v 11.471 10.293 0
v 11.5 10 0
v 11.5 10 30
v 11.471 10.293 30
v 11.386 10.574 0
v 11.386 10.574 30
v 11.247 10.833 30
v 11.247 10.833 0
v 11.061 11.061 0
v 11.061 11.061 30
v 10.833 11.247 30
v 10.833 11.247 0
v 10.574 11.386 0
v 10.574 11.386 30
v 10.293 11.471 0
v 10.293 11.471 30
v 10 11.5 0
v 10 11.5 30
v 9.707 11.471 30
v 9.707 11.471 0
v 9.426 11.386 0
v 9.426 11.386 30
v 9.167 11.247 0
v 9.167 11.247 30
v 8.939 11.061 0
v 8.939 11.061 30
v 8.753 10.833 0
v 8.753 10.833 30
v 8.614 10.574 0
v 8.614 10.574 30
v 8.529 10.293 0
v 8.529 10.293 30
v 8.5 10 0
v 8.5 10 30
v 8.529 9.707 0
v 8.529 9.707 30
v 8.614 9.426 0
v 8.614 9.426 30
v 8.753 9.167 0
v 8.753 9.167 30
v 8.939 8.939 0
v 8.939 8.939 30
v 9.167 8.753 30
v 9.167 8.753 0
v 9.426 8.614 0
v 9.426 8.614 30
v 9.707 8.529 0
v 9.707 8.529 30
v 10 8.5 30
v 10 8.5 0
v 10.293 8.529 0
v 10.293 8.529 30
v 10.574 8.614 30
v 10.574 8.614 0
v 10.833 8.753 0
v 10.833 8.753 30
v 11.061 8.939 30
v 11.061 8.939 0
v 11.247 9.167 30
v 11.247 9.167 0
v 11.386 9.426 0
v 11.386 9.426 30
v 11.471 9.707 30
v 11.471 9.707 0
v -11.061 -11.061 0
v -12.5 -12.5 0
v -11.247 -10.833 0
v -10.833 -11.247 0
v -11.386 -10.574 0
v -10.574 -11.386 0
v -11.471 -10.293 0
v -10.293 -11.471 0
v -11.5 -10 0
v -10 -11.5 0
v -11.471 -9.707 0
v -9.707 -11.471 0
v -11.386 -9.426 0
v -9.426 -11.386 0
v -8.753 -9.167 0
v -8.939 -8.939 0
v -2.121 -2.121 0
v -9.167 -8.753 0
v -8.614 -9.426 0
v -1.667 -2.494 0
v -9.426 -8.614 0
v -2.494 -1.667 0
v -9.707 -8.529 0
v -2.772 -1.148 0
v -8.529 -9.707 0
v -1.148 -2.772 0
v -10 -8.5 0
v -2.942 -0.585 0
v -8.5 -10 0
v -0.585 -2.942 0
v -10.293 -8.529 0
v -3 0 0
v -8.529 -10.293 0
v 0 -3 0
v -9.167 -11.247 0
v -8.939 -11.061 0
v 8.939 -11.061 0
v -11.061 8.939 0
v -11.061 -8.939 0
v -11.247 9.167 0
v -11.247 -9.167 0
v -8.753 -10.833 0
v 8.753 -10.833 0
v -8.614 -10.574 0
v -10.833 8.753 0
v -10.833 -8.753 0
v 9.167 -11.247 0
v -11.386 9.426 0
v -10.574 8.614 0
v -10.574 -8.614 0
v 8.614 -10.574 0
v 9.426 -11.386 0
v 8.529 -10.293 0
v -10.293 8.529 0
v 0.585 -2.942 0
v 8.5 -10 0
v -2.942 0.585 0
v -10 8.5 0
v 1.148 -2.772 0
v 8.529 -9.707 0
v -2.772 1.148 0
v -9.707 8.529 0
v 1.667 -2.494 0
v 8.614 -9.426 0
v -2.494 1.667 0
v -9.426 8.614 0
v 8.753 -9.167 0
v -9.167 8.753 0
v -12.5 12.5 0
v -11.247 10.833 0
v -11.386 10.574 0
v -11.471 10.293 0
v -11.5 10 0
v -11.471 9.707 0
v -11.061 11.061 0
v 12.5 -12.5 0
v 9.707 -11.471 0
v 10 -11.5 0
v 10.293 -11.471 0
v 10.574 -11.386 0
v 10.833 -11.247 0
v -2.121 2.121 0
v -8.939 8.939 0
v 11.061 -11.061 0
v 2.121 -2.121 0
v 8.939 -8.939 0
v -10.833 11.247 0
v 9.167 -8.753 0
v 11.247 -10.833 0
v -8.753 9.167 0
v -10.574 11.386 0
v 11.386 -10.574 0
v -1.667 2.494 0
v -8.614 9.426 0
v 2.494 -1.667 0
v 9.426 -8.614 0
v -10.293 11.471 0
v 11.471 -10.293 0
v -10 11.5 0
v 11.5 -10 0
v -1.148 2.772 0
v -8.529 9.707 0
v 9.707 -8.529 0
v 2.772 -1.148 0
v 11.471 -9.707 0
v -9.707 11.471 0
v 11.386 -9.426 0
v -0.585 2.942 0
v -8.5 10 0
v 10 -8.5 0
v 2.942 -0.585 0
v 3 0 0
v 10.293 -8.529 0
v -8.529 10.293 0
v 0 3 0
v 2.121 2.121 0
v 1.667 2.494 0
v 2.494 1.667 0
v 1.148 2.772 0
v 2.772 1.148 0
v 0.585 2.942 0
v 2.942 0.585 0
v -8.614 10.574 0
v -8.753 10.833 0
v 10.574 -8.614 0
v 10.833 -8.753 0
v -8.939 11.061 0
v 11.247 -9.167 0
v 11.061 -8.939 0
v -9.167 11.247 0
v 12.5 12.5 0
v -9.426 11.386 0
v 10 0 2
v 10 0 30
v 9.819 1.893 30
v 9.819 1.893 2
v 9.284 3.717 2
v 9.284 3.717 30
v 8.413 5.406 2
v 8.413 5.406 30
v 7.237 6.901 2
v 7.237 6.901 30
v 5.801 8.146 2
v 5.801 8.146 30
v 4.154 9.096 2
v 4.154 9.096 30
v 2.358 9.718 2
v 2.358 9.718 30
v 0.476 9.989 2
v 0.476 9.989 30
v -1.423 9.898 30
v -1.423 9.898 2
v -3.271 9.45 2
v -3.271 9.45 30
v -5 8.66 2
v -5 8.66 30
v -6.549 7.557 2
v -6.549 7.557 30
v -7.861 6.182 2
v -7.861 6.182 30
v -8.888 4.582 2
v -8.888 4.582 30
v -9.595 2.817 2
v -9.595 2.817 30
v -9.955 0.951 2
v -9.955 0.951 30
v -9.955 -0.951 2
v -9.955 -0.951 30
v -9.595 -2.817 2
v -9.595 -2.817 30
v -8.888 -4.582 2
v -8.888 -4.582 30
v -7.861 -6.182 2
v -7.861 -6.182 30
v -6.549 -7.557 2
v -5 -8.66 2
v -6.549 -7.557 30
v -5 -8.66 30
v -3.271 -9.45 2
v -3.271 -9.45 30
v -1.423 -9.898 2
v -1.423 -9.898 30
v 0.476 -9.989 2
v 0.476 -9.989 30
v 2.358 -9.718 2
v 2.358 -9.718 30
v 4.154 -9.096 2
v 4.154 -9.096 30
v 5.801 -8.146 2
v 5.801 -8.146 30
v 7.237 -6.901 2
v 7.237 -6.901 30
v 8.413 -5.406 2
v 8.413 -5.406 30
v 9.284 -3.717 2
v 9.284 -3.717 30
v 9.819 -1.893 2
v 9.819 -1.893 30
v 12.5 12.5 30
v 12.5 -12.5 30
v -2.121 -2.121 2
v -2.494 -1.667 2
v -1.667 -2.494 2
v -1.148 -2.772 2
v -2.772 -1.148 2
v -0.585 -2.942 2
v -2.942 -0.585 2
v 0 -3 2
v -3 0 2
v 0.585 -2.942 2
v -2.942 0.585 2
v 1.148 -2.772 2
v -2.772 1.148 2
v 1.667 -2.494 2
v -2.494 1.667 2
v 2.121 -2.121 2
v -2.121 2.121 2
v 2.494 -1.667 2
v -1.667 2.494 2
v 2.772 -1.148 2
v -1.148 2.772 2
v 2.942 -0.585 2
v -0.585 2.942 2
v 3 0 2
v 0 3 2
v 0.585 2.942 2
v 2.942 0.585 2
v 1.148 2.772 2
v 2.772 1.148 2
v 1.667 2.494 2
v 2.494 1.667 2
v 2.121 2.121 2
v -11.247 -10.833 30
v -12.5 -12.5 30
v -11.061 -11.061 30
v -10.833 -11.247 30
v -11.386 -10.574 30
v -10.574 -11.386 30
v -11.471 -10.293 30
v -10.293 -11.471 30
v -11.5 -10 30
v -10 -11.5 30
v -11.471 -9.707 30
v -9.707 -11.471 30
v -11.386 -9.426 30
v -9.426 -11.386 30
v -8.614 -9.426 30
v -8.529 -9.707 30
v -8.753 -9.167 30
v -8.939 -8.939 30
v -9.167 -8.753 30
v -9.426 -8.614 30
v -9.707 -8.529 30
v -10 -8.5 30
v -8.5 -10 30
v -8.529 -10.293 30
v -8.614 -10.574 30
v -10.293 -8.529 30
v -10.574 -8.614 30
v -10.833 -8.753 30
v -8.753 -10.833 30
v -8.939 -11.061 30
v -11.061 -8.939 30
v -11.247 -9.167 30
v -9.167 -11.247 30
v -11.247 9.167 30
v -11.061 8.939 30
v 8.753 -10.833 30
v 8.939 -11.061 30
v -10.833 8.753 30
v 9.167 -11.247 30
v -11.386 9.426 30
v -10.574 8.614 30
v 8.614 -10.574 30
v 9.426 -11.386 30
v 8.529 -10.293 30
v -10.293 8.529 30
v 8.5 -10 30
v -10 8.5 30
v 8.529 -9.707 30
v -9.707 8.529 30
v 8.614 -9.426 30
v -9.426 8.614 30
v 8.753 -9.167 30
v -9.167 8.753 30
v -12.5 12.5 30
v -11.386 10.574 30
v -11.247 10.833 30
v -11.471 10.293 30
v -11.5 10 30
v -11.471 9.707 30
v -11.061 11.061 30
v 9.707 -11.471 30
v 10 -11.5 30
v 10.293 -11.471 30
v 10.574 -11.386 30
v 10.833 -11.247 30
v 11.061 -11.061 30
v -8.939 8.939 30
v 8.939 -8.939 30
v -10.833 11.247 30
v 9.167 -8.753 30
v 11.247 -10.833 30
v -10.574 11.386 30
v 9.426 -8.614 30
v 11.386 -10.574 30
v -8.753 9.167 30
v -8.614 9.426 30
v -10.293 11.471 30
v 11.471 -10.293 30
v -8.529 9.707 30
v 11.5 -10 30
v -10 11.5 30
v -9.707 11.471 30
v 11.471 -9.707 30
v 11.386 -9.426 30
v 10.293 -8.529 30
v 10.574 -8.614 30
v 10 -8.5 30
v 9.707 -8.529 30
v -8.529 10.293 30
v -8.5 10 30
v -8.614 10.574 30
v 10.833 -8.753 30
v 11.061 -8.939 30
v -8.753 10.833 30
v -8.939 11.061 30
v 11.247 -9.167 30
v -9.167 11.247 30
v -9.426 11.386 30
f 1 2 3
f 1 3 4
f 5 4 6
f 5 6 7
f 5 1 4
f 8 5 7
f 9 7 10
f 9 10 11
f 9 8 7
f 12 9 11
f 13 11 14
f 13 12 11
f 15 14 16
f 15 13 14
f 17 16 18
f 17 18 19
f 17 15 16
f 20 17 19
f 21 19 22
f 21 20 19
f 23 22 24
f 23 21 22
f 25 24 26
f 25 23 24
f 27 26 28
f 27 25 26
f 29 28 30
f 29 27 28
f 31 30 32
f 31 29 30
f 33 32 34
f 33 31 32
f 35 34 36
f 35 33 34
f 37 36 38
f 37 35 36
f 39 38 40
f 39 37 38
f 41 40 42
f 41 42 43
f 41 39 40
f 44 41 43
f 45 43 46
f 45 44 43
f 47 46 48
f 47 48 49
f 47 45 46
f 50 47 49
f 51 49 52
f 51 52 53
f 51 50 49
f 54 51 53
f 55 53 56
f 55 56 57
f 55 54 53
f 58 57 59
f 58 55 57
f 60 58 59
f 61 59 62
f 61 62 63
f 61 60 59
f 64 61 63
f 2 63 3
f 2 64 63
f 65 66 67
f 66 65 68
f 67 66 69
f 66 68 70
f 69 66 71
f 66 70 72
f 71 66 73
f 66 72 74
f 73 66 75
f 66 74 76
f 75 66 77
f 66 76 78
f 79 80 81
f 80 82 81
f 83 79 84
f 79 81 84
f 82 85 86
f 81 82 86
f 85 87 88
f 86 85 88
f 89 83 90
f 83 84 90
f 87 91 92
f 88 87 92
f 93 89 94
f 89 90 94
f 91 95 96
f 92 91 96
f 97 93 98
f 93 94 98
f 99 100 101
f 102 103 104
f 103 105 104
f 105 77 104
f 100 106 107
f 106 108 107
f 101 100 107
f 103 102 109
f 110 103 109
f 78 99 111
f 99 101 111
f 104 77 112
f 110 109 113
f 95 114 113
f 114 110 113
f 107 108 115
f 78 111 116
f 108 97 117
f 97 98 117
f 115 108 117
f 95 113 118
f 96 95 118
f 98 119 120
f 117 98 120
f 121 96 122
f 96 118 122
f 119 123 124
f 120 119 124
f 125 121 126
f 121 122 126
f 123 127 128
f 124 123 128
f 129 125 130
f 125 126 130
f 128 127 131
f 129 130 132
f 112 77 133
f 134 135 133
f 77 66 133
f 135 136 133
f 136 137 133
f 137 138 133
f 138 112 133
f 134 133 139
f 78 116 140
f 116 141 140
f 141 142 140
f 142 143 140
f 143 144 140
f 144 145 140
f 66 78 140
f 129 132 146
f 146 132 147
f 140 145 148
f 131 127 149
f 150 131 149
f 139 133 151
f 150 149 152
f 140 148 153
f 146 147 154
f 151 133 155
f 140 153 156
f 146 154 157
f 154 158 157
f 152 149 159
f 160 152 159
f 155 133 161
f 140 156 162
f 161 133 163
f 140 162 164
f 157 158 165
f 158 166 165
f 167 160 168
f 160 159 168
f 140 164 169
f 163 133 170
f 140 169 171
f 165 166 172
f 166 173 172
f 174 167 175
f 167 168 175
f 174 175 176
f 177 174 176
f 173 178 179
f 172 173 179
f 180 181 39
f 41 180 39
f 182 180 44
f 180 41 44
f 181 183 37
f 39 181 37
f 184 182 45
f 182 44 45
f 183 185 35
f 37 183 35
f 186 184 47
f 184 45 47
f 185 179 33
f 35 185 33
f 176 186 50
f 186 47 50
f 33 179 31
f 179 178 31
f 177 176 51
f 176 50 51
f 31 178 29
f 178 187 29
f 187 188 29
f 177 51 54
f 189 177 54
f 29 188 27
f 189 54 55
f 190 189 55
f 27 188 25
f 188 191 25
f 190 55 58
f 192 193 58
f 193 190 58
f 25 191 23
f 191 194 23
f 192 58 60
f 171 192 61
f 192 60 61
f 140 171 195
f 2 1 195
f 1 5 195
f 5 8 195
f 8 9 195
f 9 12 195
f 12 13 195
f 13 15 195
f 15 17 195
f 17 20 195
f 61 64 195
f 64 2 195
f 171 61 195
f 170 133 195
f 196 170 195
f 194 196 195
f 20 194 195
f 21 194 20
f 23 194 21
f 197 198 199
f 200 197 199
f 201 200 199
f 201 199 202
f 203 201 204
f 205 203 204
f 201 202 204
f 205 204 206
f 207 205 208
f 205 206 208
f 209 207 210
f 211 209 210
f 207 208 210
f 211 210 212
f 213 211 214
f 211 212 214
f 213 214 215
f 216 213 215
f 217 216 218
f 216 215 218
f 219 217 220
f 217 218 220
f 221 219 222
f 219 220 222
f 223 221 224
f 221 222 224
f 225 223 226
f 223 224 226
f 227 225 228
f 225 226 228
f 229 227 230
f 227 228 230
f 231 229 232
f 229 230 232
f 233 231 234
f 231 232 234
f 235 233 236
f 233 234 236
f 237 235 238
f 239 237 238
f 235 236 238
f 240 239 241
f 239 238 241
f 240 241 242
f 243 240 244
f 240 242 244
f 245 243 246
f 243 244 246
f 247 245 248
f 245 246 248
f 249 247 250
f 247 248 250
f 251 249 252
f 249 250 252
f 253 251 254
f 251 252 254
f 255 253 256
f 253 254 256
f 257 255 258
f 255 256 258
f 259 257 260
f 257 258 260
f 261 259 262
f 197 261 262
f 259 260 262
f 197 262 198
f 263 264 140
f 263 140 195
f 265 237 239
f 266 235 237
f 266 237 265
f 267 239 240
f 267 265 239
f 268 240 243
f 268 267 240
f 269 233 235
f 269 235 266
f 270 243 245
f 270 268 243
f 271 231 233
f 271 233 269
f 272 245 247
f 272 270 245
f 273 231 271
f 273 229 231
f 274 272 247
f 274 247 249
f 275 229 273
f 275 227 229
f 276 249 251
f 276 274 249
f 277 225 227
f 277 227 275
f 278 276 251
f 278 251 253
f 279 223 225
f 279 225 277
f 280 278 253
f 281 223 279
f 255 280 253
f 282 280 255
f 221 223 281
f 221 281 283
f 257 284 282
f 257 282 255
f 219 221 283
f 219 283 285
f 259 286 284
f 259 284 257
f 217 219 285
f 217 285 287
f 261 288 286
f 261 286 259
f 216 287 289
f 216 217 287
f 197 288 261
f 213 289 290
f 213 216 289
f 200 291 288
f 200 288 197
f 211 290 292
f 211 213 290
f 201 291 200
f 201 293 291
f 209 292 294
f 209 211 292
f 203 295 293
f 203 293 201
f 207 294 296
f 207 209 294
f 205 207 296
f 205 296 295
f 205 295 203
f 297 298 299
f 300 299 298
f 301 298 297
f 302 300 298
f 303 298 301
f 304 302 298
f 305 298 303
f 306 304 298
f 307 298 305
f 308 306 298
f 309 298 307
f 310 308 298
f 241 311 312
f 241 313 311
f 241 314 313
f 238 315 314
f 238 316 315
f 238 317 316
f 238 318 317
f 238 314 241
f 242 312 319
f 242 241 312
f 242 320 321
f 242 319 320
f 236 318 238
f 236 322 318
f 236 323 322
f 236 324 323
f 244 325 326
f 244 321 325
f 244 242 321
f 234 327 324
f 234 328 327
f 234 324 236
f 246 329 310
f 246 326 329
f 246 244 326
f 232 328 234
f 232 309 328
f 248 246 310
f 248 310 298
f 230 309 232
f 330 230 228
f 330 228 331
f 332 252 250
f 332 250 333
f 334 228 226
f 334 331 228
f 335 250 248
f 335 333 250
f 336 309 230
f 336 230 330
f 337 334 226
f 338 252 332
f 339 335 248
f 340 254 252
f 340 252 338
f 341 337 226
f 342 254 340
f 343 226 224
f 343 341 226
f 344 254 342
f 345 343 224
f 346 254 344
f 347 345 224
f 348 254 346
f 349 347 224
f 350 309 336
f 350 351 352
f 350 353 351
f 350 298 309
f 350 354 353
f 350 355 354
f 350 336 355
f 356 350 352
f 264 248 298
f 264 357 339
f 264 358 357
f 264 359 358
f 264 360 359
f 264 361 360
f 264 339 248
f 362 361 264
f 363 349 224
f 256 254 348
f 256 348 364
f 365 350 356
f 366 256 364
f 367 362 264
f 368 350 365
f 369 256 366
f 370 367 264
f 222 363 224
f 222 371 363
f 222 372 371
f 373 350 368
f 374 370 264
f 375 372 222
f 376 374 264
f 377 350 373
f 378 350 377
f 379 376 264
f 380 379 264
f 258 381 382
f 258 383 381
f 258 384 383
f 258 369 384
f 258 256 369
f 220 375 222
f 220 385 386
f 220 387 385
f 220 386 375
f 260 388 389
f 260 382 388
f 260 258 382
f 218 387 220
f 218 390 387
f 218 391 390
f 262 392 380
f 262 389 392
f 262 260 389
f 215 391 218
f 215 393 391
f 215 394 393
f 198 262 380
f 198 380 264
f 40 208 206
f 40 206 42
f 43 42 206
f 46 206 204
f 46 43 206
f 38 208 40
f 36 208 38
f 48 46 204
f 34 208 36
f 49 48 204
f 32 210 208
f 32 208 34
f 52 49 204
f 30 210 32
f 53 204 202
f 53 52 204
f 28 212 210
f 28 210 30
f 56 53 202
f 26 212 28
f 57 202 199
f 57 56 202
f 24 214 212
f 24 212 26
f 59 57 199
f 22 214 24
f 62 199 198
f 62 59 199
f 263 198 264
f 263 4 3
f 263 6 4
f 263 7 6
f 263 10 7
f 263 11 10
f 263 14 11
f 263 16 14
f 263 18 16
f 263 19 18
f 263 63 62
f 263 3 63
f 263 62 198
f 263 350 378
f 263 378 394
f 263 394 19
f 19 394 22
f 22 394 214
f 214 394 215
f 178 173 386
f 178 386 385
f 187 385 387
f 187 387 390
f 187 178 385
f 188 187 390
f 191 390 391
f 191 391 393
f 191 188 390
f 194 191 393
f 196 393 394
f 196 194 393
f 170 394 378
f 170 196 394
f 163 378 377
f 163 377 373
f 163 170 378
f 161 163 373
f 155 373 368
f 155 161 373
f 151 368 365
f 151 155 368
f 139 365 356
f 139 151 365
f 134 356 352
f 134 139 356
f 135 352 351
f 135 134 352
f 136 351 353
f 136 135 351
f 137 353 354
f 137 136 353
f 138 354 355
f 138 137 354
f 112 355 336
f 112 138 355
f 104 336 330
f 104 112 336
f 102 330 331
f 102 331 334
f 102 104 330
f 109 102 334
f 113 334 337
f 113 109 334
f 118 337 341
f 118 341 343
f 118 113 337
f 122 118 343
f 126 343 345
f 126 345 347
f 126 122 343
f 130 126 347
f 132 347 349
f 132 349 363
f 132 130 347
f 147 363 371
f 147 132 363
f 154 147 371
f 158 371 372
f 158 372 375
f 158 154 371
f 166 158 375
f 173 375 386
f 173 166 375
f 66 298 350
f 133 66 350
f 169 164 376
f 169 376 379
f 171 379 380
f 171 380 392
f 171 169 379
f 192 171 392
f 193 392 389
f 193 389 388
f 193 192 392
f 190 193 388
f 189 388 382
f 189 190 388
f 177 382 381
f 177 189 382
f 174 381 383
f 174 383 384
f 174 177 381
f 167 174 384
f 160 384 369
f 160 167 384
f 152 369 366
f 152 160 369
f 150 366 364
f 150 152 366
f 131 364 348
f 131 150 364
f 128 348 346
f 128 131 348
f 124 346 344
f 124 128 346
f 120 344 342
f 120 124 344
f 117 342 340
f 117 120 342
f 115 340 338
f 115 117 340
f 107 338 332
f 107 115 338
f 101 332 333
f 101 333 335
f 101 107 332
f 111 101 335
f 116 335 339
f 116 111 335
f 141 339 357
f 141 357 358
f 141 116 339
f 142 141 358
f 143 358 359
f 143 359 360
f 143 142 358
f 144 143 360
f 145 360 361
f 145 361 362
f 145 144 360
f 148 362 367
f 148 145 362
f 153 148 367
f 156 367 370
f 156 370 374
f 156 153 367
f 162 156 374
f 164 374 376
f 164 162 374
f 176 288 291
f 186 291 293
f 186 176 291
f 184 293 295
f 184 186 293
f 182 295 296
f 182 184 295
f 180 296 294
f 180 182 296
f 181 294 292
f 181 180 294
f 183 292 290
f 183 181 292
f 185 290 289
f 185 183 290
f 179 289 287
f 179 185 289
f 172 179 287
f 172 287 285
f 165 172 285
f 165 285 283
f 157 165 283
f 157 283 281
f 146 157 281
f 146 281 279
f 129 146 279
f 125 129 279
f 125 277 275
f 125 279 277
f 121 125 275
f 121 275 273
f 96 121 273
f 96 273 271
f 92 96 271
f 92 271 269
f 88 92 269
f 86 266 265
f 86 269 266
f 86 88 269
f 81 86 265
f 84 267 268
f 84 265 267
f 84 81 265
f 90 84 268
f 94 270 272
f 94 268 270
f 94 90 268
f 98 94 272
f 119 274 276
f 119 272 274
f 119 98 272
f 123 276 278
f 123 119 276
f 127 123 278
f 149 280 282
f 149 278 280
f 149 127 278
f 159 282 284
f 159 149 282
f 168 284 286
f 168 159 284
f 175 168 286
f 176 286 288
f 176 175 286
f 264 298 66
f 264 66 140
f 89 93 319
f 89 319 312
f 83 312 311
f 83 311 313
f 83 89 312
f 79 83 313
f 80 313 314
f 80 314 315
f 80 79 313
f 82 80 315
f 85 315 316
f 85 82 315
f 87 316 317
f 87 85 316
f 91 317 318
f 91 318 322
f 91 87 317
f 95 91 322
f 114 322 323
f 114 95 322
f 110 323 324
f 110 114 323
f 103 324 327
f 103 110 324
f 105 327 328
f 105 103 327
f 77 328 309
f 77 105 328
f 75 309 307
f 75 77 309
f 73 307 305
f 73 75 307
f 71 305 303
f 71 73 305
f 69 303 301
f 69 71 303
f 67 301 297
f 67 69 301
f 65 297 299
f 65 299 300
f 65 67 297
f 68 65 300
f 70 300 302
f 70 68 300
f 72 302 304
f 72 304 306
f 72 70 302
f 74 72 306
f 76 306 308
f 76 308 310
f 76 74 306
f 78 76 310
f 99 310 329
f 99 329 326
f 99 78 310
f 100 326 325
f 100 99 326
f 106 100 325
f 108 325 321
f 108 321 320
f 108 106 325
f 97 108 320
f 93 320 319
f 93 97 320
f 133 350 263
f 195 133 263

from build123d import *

# Parameters (mm, degrees)
ESQUISSE1_W      = 25
ESQUISSE1_H      = 25
ESQUISSE1_R      = 1.5
ESQUISSE1_R_2    = 3
EXTRUSION3_DEPTH = 30
ESQUISSE8_R      = 10
EXTRUSION4_DEPTH = 28


with BuildPart() as part:
    # Esquisse1 → Extrusion3 (new body)
    with BuildSketch(Plane.XY):
        Rectangle(ESQUISSE1_W, ESQUISSE1_H)
        with Locations((10, 10)):
            Circle(ESQUISSE1_R, mode=Mode.SUBTRACT)
        Circle(ESQUISSE1_R_2, mode=Mode.SUBTRACT)
        with Locations((-10, 10)):
            Circle(ESQUISSE1_R, mode=Mode.SUBTRACT)
        with Locations((10, -10)):
            Circle(ESQUISSE1_R, mode=Mode.SUBTRACT)
        with Locations((-10, -10)):
            Circle(ESQUISSE1_R, mode=Mode.SUBTRACT)
    extrude(amount=EXTRUSION3_DEPTH)

    # Esquisse8 → Extrusion4 (cut)
    with BuildSketch(Plane.XY.offset(30)):
        Circle(ESQUISSE8_R)
    extrude(amount=-EXTRUSION4_DEPTH, mode=Mode.SUBTRACT)


solid = part.part
